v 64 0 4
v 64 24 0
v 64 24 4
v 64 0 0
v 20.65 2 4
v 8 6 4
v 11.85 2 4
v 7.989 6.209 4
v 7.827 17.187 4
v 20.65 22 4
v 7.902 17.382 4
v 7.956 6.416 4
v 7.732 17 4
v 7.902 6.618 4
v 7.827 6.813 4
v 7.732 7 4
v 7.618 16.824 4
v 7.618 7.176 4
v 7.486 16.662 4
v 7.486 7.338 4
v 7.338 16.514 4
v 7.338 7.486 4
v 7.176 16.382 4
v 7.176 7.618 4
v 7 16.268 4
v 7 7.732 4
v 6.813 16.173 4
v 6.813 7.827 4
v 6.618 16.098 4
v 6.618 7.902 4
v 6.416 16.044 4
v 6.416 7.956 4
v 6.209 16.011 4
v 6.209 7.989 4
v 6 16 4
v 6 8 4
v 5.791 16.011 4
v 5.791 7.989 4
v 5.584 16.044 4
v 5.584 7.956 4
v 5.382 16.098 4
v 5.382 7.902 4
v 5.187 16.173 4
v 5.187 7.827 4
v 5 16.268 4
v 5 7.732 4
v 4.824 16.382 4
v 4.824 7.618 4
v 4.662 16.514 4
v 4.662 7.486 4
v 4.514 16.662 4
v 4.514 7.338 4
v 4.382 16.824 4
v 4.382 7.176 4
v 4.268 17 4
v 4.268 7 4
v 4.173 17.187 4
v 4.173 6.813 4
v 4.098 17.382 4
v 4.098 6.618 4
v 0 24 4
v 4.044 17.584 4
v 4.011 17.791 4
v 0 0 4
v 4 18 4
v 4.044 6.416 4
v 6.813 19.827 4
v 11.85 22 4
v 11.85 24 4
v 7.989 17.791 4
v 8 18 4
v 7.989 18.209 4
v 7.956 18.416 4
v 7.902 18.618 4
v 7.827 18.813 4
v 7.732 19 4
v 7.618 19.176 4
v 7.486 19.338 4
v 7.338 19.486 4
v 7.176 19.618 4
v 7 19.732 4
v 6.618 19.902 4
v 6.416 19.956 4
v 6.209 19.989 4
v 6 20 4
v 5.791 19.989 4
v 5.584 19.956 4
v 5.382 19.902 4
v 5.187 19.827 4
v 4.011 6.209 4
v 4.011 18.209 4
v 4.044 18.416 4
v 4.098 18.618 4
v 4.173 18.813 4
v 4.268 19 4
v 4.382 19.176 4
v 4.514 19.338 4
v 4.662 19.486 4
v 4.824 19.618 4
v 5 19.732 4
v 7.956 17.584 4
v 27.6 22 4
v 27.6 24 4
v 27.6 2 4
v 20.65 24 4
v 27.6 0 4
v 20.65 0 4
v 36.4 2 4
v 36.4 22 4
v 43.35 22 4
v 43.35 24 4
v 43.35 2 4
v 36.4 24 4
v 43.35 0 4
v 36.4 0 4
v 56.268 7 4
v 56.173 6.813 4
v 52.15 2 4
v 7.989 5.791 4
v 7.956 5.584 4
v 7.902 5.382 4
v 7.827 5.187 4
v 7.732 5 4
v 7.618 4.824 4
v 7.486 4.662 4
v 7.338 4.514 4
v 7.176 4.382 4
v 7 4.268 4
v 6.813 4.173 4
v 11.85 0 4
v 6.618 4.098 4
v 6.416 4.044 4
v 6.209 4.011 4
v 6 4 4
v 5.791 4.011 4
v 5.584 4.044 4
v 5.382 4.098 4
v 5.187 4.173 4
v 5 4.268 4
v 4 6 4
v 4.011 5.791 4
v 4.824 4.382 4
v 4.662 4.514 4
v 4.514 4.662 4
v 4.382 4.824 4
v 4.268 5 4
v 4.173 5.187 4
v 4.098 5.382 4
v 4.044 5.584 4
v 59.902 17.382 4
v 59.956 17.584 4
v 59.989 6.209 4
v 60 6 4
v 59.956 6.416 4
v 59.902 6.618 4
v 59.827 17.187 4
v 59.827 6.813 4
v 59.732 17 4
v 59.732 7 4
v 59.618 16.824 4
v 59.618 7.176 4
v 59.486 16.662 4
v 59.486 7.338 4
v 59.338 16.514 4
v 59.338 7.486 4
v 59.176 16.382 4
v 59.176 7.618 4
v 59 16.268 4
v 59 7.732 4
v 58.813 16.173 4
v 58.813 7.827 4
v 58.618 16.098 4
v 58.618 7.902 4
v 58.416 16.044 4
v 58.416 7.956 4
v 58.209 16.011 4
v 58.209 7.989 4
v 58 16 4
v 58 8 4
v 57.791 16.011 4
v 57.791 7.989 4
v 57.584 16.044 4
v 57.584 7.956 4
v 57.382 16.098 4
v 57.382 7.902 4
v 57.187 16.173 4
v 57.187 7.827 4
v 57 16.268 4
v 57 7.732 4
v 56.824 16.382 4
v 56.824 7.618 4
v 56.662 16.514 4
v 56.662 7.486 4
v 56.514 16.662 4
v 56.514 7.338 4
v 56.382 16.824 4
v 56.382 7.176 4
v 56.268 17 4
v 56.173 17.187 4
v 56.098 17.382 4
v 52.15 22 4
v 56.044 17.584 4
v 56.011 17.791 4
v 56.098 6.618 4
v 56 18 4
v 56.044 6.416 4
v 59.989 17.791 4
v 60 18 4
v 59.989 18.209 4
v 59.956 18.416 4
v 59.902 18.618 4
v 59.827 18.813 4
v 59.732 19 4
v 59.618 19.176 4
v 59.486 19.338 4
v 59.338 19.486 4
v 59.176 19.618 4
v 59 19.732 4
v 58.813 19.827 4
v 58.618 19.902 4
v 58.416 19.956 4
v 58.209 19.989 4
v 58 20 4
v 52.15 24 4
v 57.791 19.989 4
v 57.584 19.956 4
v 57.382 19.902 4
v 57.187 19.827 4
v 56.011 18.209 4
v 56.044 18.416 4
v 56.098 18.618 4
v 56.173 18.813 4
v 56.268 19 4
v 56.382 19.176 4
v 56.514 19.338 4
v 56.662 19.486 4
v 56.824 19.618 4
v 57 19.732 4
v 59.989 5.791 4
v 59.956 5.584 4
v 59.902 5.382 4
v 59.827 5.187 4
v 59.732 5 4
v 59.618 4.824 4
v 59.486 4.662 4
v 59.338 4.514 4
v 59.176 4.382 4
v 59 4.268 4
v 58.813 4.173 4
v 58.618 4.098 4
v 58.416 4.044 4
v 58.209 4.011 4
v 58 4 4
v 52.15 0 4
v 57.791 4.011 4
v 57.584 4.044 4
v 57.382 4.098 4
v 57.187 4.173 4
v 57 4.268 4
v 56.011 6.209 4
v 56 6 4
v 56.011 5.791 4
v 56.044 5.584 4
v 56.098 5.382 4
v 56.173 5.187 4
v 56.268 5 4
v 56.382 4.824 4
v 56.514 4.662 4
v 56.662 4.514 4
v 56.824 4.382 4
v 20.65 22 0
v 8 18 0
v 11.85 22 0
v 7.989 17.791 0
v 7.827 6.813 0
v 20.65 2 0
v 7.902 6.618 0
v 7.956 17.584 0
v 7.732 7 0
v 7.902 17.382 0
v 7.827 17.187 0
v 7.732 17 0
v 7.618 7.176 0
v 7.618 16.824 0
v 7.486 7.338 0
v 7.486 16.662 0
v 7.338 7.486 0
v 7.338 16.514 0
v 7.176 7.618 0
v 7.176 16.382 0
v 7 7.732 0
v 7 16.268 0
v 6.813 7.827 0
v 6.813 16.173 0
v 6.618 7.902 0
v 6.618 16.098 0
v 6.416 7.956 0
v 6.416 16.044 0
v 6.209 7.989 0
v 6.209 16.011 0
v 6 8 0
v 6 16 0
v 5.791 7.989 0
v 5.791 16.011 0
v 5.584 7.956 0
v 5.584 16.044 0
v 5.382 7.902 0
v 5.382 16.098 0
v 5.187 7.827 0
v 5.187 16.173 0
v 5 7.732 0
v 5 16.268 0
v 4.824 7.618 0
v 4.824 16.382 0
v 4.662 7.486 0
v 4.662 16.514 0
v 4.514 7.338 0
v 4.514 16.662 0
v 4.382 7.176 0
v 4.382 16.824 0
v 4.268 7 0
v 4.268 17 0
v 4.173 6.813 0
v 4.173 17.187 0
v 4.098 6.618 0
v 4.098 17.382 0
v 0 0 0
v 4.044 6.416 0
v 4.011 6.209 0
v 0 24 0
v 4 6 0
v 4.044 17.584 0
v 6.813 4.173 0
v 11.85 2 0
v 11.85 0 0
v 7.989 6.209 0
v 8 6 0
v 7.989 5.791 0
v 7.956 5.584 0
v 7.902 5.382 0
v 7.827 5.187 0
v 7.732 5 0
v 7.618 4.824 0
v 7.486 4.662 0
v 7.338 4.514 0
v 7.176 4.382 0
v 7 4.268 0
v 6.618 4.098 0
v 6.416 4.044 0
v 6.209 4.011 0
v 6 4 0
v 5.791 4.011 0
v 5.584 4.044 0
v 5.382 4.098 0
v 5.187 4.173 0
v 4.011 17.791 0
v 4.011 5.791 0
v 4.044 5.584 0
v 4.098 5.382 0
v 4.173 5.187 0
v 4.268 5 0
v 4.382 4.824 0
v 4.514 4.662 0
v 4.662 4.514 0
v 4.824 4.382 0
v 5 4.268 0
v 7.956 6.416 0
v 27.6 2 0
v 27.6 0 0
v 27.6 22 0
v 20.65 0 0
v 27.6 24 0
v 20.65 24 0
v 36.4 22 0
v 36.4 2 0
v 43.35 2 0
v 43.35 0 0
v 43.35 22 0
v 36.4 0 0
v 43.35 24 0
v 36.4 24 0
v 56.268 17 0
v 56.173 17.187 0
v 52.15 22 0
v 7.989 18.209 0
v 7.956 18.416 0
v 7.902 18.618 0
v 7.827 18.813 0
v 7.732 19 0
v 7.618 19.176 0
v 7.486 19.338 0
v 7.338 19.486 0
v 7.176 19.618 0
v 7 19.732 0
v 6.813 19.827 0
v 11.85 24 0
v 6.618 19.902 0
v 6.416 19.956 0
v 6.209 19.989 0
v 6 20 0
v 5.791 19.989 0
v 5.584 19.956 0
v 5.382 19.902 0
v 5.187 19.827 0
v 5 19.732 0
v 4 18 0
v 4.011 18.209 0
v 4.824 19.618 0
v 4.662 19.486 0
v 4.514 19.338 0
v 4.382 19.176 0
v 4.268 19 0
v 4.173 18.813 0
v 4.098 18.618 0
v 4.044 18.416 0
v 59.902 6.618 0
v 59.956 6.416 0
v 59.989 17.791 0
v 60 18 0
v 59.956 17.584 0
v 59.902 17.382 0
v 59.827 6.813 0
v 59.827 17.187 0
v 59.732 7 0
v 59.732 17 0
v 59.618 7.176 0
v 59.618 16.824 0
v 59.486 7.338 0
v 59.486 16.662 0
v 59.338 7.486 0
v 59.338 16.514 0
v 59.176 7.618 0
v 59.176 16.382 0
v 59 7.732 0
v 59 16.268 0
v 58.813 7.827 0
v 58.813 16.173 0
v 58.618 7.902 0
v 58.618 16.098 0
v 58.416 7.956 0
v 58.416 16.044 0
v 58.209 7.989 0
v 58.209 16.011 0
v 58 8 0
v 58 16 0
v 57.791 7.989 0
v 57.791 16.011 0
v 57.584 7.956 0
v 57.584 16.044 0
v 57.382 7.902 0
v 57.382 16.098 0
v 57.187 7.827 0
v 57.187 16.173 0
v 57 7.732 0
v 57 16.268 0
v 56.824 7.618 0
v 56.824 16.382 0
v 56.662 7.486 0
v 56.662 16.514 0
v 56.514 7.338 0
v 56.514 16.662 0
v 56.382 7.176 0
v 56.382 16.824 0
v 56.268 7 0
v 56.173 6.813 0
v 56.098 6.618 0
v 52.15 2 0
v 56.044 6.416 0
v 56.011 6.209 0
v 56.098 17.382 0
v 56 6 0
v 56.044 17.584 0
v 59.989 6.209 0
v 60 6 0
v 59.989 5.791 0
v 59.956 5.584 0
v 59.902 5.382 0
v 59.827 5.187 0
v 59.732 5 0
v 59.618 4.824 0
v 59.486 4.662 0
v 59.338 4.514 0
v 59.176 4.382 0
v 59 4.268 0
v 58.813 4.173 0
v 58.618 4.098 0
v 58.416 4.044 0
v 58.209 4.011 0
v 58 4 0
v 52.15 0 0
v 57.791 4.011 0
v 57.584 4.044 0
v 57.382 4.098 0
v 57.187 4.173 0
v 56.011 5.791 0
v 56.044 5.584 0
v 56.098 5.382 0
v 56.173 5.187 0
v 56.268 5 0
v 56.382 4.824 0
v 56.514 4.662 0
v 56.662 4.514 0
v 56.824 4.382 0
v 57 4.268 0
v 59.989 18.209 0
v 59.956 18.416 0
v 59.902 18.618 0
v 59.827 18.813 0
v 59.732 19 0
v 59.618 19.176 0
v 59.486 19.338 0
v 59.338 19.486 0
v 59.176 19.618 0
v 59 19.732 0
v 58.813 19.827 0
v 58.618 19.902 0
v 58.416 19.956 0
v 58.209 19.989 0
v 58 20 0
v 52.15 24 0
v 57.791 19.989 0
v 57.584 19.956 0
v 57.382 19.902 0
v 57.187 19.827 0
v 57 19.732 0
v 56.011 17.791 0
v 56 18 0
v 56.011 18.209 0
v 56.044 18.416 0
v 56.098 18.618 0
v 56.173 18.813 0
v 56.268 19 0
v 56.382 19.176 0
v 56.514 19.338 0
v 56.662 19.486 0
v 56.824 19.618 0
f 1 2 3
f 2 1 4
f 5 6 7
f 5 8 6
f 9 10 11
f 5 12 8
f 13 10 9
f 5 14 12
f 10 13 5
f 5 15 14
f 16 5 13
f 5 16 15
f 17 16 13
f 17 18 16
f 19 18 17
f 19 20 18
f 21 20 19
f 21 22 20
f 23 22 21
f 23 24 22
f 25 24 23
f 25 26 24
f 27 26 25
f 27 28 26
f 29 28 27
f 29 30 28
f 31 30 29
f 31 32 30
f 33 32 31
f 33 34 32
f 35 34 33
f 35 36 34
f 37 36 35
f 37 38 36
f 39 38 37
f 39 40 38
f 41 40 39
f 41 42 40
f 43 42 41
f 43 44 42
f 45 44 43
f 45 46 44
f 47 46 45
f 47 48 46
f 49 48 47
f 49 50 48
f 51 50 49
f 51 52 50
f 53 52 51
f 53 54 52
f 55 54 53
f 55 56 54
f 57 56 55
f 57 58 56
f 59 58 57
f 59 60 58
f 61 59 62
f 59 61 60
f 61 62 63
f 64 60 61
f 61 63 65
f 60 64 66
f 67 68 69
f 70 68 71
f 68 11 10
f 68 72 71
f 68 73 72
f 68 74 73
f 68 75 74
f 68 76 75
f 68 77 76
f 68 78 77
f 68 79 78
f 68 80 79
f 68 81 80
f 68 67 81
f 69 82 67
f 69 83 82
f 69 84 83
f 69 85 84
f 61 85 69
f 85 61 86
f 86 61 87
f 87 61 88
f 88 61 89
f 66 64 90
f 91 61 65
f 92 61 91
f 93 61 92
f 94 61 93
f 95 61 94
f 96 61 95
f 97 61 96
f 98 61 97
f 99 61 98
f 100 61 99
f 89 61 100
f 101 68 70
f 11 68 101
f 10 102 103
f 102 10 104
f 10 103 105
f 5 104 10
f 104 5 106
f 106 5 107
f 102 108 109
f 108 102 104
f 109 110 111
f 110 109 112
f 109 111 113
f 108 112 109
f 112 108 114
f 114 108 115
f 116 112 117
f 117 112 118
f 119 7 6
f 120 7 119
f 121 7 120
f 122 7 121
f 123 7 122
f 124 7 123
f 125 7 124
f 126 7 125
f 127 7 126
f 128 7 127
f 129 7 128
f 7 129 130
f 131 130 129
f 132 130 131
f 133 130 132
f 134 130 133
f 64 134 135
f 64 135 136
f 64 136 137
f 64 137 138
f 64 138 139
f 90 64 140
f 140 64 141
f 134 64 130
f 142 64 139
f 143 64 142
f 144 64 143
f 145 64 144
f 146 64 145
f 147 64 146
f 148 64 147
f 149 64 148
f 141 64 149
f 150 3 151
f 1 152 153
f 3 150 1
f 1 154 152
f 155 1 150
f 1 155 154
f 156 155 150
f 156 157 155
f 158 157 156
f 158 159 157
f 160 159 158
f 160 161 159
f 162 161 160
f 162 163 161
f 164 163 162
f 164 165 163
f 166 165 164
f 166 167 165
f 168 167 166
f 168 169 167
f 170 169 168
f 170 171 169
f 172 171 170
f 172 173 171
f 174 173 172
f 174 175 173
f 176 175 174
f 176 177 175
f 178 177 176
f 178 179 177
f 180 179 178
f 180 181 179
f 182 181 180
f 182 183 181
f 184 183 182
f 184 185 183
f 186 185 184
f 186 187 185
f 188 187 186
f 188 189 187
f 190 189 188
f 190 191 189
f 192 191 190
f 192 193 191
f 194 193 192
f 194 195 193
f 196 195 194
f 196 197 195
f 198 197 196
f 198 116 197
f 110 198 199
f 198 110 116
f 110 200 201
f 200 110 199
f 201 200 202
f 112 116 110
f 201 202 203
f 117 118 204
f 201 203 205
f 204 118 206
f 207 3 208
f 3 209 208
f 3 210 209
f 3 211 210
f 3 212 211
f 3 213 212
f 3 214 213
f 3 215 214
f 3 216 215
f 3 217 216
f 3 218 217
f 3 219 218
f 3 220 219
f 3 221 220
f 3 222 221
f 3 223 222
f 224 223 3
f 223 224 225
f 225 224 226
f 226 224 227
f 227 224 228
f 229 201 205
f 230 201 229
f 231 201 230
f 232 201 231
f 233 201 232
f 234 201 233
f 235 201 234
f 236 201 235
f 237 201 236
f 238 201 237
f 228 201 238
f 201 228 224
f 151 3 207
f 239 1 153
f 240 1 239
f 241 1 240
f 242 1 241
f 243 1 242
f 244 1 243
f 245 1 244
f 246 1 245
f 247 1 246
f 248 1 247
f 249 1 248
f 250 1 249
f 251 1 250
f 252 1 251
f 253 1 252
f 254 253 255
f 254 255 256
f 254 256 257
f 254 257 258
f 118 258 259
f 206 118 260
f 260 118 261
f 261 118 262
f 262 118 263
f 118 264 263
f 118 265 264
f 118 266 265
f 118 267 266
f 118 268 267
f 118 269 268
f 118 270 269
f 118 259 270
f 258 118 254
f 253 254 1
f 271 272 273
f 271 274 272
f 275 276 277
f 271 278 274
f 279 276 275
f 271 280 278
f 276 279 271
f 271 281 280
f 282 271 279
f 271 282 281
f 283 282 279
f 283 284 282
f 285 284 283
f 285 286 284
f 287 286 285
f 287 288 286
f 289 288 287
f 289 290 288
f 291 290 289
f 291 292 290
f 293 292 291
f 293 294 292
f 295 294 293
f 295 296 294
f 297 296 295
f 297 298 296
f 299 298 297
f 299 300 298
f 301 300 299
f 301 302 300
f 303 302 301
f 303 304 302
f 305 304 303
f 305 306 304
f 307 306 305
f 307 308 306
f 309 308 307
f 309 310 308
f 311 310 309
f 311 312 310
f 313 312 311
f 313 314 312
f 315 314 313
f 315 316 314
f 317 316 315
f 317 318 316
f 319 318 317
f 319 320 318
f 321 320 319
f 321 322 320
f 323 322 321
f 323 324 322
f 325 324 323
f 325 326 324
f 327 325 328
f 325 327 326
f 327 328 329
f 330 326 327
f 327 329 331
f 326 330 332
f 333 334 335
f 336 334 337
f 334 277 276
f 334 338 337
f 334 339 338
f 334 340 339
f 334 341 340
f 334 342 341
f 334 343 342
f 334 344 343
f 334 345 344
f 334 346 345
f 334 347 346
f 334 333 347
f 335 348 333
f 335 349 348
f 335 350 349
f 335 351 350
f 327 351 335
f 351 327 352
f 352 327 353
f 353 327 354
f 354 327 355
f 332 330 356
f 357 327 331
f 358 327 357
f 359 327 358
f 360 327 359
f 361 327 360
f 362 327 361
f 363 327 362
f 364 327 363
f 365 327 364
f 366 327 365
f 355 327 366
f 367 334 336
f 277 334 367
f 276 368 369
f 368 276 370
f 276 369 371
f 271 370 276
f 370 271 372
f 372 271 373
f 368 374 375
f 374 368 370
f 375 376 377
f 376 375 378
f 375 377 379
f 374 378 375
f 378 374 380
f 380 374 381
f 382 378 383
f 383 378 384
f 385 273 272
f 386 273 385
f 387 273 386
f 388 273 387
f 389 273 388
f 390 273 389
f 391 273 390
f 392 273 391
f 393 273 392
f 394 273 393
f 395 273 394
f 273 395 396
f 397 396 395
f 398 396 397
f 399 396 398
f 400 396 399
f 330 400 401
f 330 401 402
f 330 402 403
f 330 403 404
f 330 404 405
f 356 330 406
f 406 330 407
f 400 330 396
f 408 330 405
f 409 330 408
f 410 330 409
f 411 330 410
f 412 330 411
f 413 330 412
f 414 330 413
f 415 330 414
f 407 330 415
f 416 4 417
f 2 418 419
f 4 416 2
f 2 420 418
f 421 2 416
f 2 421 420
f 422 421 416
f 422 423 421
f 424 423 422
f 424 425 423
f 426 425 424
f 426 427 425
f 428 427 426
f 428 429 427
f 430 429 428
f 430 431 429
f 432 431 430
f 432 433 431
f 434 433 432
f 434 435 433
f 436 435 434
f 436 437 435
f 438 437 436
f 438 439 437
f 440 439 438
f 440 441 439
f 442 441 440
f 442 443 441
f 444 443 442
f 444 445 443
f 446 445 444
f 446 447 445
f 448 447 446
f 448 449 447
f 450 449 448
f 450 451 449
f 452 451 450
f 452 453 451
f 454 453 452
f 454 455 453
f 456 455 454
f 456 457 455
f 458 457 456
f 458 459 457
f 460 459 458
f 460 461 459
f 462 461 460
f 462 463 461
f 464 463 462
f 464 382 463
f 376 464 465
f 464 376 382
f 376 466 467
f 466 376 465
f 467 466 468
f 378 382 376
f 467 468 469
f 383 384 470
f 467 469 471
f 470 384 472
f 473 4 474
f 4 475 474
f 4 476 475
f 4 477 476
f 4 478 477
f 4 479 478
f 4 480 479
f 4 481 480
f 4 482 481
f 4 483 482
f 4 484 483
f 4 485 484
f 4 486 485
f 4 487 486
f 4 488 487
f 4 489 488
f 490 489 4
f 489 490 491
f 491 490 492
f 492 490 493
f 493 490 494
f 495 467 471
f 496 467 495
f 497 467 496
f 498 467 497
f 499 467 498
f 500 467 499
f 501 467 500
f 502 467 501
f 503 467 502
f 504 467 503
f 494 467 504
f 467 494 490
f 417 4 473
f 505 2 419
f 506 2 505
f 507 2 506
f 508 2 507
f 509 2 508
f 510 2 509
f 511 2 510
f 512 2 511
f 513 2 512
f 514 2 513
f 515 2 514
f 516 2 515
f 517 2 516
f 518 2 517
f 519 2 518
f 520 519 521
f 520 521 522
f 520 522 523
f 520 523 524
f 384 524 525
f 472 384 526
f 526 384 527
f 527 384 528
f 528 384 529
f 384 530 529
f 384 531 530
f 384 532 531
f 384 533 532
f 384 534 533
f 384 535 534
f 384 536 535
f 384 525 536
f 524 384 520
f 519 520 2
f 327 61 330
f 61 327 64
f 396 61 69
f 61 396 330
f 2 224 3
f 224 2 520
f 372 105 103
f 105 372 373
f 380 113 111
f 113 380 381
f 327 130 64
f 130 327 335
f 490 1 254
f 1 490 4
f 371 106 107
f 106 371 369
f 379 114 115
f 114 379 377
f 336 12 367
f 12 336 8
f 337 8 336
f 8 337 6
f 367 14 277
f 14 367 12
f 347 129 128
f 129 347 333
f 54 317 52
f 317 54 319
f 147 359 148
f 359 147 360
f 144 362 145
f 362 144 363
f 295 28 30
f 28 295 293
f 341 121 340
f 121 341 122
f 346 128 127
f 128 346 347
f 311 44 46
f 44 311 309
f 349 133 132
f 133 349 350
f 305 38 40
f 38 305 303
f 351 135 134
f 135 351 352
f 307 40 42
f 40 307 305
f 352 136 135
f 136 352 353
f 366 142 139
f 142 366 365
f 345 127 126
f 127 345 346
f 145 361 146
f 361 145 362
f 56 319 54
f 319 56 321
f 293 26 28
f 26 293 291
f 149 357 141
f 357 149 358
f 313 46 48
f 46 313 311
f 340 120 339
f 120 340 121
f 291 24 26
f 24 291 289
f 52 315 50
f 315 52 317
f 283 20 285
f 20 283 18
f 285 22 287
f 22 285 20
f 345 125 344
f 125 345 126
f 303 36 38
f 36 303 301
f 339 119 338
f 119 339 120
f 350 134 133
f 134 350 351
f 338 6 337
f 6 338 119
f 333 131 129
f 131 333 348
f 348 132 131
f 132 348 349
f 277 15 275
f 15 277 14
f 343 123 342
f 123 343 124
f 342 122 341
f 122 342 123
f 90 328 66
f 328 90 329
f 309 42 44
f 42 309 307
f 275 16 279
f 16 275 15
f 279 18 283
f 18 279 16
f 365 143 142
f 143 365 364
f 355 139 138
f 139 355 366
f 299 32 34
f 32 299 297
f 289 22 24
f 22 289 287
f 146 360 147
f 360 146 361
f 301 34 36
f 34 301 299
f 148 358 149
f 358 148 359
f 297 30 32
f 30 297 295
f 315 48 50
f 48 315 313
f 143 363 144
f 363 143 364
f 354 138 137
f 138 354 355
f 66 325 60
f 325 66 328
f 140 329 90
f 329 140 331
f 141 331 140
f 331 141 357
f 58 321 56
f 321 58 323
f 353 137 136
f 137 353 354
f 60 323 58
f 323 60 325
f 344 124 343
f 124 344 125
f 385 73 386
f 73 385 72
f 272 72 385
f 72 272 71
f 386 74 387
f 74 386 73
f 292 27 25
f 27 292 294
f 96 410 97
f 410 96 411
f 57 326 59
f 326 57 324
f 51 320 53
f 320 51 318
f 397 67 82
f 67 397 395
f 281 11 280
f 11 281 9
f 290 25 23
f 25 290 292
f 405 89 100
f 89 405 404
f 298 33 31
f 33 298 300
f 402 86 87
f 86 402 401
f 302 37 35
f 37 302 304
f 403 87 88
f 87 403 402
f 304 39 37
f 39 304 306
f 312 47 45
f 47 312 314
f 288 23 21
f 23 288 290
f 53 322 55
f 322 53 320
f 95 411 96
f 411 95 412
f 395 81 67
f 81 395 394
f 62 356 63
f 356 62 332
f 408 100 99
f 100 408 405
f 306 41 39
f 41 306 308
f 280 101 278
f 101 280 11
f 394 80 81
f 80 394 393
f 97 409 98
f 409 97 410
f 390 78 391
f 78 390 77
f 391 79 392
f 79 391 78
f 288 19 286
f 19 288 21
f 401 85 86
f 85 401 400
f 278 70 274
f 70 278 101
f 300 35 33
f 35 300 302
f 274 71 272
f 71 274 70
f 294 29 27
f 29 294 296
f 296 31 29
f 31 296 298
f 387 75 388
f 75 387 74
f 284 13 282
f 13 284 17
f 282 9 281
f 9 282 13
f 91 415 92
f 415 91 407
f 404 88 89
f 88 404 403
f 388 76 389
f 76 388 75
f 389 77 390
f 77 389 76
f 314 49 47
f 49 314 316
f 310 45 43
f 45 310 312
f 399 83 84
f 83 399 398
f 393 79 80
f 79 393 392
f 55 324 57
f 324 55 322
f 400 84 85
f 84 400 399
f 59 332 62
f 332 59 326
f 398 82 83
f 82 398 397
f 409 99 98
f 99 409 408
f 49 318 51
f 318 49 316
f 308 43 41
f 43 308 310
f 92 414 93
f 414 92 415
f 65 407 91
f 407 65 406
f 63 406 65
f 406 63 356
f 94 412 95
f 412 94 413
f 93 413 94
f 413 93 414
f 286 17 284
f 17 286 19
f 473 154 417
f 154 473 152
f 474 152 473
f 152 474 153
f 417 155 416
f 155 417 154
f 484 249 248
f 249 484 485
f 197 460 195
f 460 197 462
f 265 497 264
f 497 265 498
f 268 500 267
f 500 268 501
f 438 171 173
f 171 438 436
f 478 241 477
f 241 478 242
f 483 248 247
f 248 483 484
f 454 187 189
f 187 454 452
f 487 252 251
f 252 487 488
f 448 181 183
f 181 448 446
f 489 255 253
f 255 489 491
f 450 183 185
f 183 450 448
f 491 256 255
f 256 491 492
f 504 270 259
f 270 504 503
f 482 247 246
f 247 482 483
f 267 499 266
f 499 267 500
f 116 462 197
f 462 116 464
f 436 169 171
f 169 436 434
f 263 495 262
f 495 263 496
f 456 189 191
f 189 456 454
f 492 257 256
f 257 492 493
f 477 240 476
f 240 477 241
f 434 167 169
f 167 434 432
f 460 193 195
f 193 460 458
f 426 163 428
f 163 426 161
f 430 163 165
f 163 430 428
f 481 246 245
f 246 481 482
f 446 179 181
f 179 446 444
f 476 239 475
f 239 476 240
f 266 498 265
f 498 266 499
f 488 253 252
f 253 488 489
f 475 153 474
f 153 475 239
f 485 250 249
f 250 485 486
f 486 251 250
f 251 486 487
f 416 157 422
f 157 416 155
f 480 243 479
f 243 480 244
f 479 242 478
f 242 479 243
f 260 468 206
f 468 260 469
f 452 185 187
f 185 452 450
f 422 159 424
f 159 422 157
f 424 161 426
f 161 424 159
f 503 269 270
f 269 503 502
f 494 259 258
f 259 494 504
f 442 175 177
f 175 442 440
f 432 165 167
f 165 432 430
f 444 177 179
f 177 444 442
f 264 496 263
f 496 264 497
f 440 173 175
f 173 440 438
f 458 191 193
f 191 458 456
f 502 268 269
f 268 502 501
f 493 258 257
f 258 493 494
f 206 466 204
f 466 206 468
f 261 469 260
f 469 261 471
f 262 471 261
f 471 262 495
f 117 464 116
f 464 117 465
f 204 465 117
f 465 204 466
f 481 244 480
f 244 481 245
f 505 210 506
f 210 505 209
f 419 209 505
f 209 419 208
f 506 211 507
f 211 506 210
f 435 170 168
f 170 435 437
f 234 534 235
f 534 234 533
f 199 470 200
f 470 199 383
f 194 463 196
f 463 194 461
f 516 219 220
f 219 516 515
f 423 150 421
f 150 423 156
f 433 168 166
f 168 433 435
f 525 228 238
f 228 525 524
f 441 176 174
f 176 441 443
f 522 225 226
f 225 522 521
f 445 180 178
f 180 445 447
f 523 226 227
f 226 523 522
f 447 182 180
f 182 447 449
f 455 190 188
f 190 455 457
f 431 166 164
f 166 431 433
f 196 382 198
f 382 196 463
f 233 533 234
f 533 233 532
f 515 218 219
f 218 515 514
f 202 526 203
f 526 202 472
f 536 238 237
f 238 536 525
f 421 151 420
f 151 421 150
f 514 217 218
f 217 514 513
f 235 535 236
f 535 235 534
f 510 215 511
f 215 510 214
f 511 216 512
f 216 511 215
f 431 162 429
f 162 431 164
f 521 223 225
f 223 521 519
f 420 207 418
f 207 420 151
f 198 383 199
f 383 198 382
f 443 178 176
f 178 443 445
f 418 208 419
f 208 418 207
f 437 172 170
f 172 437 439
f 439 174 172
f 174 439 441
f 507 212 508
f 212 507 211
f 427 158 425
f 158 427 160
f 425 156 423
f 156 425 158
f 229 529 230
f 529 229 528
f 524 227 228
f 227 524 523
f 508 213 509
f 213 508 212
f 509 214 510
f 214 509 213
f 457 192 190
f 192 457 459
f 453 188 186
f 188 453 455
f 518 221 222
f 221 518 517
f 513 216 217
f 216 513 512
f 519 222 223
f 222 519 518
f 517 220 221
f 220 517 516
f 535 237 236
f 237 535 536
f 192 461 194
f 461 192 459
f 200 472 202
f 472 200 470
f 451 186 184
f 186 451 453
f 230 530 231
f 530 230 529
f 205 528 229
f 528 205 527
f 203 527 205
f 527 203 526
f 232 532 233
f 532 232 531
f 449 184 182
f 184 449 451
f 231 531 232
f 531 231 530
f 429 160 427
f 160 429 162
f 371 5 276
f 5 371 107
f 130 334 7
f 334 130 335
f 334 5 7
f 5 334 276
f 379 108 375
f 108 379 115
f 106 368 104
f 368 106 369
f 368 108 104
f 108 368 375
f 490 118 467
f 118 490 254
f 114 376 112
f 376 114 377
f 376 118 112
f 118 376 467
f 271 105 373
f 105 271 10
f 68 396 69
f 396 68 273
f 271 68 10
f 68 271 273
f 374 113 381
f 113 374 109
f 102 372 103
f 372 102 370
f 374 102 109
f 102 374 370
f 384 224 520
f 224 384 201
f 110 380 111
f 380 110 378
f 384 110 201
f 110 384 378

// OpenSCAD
// Baseplate for Brushless DC Fan 12V/0.12A
// Dimensions:
// H x W x D = 40 x 40 x 20.5mm(NoTypo!)
// Hole raster 31.5 x 31.5mm
// 
// For mounting on a flat surface using brackets on either side
// Two brackets must be printed
//
// Version 0.1

$fn=60;

W=40; //Width (equals height)
Wbp=W+24; //Base Plate Width
Drotor=37; // Fan in- outlet diameter 37mm
grid=31.5; // Mounting hole grid
depth=20.0; // Fan depth with correction

Hbr=8; //Bracket height
Tbr=2; //Bracket thickness
Hfp=2*Tbr; //Face plate height
Dbp=depth+2*Tbr; //
clearance=0.4; //Clearance per side. Typically equals nozzle diameter. 
hole=4.0; // Mounting holes
slot=hole+clearance; //Please do not Modify. This represents half the slot width

//Baseplate with holes & cutouts
difference(){
cube ([Wbp,Dbp,Hfp]);
//Mounting holes
translate(v=[(Wbp/2)-(W/2)-((Wbp-W)/4),(Dbp/2)-(Dbp/4),0])
    { cylinder(h=Hfp, d=hole); }
translate(v=[(Wbp/2)-(W/2)-((Wbp-W)/4),(Dbp/2)+(Dbp/4),0])
    { cylinder(h=Hfp, d=hole); }
translate(v=[(Wbp/2)+(W/2)+((Wbp-W)/4),(Dbp/2)-(Dbp/4),0])
    { cylinder(h=Hfp, d=hole); }
translate(v=[(Wbp/2)+(W/2)+((Wbp-W)/4),(Dbp/2)+(Dbp/4),0])
    { cylinder(h=Hfp, d=hole); }
//Slots    
translate(v=[(Wbp/2)-(grid/2)-slot,0,0]){cube ([slot*2,Tbr,Hfp]);}
translate(v=[(Wbp/2)-slot,0,0]){cube ([slot*2,Tbr,Hfp]);}
translate(v=[(Wbp/2)+(grid/2)-slot,0,0]){cube ([slot*2,Tbr,Hfp]);}

translate(v=[(Wbp/2)-(grid/2)-slot,(Dbp-Tbr),0]){cube([slot*2,Tbr,Hfp]);}
translate(v=[(Wbp/2)-slot,(Dbp-Tbr),0]){cube ([slot*2,Tbr,Hfp]);}
translate(v=[(Wbp/2)+(grid/2)-slot,(Dbp-Tbr),0]){cube([slot*2,Tbr,Hfp]);}
}
